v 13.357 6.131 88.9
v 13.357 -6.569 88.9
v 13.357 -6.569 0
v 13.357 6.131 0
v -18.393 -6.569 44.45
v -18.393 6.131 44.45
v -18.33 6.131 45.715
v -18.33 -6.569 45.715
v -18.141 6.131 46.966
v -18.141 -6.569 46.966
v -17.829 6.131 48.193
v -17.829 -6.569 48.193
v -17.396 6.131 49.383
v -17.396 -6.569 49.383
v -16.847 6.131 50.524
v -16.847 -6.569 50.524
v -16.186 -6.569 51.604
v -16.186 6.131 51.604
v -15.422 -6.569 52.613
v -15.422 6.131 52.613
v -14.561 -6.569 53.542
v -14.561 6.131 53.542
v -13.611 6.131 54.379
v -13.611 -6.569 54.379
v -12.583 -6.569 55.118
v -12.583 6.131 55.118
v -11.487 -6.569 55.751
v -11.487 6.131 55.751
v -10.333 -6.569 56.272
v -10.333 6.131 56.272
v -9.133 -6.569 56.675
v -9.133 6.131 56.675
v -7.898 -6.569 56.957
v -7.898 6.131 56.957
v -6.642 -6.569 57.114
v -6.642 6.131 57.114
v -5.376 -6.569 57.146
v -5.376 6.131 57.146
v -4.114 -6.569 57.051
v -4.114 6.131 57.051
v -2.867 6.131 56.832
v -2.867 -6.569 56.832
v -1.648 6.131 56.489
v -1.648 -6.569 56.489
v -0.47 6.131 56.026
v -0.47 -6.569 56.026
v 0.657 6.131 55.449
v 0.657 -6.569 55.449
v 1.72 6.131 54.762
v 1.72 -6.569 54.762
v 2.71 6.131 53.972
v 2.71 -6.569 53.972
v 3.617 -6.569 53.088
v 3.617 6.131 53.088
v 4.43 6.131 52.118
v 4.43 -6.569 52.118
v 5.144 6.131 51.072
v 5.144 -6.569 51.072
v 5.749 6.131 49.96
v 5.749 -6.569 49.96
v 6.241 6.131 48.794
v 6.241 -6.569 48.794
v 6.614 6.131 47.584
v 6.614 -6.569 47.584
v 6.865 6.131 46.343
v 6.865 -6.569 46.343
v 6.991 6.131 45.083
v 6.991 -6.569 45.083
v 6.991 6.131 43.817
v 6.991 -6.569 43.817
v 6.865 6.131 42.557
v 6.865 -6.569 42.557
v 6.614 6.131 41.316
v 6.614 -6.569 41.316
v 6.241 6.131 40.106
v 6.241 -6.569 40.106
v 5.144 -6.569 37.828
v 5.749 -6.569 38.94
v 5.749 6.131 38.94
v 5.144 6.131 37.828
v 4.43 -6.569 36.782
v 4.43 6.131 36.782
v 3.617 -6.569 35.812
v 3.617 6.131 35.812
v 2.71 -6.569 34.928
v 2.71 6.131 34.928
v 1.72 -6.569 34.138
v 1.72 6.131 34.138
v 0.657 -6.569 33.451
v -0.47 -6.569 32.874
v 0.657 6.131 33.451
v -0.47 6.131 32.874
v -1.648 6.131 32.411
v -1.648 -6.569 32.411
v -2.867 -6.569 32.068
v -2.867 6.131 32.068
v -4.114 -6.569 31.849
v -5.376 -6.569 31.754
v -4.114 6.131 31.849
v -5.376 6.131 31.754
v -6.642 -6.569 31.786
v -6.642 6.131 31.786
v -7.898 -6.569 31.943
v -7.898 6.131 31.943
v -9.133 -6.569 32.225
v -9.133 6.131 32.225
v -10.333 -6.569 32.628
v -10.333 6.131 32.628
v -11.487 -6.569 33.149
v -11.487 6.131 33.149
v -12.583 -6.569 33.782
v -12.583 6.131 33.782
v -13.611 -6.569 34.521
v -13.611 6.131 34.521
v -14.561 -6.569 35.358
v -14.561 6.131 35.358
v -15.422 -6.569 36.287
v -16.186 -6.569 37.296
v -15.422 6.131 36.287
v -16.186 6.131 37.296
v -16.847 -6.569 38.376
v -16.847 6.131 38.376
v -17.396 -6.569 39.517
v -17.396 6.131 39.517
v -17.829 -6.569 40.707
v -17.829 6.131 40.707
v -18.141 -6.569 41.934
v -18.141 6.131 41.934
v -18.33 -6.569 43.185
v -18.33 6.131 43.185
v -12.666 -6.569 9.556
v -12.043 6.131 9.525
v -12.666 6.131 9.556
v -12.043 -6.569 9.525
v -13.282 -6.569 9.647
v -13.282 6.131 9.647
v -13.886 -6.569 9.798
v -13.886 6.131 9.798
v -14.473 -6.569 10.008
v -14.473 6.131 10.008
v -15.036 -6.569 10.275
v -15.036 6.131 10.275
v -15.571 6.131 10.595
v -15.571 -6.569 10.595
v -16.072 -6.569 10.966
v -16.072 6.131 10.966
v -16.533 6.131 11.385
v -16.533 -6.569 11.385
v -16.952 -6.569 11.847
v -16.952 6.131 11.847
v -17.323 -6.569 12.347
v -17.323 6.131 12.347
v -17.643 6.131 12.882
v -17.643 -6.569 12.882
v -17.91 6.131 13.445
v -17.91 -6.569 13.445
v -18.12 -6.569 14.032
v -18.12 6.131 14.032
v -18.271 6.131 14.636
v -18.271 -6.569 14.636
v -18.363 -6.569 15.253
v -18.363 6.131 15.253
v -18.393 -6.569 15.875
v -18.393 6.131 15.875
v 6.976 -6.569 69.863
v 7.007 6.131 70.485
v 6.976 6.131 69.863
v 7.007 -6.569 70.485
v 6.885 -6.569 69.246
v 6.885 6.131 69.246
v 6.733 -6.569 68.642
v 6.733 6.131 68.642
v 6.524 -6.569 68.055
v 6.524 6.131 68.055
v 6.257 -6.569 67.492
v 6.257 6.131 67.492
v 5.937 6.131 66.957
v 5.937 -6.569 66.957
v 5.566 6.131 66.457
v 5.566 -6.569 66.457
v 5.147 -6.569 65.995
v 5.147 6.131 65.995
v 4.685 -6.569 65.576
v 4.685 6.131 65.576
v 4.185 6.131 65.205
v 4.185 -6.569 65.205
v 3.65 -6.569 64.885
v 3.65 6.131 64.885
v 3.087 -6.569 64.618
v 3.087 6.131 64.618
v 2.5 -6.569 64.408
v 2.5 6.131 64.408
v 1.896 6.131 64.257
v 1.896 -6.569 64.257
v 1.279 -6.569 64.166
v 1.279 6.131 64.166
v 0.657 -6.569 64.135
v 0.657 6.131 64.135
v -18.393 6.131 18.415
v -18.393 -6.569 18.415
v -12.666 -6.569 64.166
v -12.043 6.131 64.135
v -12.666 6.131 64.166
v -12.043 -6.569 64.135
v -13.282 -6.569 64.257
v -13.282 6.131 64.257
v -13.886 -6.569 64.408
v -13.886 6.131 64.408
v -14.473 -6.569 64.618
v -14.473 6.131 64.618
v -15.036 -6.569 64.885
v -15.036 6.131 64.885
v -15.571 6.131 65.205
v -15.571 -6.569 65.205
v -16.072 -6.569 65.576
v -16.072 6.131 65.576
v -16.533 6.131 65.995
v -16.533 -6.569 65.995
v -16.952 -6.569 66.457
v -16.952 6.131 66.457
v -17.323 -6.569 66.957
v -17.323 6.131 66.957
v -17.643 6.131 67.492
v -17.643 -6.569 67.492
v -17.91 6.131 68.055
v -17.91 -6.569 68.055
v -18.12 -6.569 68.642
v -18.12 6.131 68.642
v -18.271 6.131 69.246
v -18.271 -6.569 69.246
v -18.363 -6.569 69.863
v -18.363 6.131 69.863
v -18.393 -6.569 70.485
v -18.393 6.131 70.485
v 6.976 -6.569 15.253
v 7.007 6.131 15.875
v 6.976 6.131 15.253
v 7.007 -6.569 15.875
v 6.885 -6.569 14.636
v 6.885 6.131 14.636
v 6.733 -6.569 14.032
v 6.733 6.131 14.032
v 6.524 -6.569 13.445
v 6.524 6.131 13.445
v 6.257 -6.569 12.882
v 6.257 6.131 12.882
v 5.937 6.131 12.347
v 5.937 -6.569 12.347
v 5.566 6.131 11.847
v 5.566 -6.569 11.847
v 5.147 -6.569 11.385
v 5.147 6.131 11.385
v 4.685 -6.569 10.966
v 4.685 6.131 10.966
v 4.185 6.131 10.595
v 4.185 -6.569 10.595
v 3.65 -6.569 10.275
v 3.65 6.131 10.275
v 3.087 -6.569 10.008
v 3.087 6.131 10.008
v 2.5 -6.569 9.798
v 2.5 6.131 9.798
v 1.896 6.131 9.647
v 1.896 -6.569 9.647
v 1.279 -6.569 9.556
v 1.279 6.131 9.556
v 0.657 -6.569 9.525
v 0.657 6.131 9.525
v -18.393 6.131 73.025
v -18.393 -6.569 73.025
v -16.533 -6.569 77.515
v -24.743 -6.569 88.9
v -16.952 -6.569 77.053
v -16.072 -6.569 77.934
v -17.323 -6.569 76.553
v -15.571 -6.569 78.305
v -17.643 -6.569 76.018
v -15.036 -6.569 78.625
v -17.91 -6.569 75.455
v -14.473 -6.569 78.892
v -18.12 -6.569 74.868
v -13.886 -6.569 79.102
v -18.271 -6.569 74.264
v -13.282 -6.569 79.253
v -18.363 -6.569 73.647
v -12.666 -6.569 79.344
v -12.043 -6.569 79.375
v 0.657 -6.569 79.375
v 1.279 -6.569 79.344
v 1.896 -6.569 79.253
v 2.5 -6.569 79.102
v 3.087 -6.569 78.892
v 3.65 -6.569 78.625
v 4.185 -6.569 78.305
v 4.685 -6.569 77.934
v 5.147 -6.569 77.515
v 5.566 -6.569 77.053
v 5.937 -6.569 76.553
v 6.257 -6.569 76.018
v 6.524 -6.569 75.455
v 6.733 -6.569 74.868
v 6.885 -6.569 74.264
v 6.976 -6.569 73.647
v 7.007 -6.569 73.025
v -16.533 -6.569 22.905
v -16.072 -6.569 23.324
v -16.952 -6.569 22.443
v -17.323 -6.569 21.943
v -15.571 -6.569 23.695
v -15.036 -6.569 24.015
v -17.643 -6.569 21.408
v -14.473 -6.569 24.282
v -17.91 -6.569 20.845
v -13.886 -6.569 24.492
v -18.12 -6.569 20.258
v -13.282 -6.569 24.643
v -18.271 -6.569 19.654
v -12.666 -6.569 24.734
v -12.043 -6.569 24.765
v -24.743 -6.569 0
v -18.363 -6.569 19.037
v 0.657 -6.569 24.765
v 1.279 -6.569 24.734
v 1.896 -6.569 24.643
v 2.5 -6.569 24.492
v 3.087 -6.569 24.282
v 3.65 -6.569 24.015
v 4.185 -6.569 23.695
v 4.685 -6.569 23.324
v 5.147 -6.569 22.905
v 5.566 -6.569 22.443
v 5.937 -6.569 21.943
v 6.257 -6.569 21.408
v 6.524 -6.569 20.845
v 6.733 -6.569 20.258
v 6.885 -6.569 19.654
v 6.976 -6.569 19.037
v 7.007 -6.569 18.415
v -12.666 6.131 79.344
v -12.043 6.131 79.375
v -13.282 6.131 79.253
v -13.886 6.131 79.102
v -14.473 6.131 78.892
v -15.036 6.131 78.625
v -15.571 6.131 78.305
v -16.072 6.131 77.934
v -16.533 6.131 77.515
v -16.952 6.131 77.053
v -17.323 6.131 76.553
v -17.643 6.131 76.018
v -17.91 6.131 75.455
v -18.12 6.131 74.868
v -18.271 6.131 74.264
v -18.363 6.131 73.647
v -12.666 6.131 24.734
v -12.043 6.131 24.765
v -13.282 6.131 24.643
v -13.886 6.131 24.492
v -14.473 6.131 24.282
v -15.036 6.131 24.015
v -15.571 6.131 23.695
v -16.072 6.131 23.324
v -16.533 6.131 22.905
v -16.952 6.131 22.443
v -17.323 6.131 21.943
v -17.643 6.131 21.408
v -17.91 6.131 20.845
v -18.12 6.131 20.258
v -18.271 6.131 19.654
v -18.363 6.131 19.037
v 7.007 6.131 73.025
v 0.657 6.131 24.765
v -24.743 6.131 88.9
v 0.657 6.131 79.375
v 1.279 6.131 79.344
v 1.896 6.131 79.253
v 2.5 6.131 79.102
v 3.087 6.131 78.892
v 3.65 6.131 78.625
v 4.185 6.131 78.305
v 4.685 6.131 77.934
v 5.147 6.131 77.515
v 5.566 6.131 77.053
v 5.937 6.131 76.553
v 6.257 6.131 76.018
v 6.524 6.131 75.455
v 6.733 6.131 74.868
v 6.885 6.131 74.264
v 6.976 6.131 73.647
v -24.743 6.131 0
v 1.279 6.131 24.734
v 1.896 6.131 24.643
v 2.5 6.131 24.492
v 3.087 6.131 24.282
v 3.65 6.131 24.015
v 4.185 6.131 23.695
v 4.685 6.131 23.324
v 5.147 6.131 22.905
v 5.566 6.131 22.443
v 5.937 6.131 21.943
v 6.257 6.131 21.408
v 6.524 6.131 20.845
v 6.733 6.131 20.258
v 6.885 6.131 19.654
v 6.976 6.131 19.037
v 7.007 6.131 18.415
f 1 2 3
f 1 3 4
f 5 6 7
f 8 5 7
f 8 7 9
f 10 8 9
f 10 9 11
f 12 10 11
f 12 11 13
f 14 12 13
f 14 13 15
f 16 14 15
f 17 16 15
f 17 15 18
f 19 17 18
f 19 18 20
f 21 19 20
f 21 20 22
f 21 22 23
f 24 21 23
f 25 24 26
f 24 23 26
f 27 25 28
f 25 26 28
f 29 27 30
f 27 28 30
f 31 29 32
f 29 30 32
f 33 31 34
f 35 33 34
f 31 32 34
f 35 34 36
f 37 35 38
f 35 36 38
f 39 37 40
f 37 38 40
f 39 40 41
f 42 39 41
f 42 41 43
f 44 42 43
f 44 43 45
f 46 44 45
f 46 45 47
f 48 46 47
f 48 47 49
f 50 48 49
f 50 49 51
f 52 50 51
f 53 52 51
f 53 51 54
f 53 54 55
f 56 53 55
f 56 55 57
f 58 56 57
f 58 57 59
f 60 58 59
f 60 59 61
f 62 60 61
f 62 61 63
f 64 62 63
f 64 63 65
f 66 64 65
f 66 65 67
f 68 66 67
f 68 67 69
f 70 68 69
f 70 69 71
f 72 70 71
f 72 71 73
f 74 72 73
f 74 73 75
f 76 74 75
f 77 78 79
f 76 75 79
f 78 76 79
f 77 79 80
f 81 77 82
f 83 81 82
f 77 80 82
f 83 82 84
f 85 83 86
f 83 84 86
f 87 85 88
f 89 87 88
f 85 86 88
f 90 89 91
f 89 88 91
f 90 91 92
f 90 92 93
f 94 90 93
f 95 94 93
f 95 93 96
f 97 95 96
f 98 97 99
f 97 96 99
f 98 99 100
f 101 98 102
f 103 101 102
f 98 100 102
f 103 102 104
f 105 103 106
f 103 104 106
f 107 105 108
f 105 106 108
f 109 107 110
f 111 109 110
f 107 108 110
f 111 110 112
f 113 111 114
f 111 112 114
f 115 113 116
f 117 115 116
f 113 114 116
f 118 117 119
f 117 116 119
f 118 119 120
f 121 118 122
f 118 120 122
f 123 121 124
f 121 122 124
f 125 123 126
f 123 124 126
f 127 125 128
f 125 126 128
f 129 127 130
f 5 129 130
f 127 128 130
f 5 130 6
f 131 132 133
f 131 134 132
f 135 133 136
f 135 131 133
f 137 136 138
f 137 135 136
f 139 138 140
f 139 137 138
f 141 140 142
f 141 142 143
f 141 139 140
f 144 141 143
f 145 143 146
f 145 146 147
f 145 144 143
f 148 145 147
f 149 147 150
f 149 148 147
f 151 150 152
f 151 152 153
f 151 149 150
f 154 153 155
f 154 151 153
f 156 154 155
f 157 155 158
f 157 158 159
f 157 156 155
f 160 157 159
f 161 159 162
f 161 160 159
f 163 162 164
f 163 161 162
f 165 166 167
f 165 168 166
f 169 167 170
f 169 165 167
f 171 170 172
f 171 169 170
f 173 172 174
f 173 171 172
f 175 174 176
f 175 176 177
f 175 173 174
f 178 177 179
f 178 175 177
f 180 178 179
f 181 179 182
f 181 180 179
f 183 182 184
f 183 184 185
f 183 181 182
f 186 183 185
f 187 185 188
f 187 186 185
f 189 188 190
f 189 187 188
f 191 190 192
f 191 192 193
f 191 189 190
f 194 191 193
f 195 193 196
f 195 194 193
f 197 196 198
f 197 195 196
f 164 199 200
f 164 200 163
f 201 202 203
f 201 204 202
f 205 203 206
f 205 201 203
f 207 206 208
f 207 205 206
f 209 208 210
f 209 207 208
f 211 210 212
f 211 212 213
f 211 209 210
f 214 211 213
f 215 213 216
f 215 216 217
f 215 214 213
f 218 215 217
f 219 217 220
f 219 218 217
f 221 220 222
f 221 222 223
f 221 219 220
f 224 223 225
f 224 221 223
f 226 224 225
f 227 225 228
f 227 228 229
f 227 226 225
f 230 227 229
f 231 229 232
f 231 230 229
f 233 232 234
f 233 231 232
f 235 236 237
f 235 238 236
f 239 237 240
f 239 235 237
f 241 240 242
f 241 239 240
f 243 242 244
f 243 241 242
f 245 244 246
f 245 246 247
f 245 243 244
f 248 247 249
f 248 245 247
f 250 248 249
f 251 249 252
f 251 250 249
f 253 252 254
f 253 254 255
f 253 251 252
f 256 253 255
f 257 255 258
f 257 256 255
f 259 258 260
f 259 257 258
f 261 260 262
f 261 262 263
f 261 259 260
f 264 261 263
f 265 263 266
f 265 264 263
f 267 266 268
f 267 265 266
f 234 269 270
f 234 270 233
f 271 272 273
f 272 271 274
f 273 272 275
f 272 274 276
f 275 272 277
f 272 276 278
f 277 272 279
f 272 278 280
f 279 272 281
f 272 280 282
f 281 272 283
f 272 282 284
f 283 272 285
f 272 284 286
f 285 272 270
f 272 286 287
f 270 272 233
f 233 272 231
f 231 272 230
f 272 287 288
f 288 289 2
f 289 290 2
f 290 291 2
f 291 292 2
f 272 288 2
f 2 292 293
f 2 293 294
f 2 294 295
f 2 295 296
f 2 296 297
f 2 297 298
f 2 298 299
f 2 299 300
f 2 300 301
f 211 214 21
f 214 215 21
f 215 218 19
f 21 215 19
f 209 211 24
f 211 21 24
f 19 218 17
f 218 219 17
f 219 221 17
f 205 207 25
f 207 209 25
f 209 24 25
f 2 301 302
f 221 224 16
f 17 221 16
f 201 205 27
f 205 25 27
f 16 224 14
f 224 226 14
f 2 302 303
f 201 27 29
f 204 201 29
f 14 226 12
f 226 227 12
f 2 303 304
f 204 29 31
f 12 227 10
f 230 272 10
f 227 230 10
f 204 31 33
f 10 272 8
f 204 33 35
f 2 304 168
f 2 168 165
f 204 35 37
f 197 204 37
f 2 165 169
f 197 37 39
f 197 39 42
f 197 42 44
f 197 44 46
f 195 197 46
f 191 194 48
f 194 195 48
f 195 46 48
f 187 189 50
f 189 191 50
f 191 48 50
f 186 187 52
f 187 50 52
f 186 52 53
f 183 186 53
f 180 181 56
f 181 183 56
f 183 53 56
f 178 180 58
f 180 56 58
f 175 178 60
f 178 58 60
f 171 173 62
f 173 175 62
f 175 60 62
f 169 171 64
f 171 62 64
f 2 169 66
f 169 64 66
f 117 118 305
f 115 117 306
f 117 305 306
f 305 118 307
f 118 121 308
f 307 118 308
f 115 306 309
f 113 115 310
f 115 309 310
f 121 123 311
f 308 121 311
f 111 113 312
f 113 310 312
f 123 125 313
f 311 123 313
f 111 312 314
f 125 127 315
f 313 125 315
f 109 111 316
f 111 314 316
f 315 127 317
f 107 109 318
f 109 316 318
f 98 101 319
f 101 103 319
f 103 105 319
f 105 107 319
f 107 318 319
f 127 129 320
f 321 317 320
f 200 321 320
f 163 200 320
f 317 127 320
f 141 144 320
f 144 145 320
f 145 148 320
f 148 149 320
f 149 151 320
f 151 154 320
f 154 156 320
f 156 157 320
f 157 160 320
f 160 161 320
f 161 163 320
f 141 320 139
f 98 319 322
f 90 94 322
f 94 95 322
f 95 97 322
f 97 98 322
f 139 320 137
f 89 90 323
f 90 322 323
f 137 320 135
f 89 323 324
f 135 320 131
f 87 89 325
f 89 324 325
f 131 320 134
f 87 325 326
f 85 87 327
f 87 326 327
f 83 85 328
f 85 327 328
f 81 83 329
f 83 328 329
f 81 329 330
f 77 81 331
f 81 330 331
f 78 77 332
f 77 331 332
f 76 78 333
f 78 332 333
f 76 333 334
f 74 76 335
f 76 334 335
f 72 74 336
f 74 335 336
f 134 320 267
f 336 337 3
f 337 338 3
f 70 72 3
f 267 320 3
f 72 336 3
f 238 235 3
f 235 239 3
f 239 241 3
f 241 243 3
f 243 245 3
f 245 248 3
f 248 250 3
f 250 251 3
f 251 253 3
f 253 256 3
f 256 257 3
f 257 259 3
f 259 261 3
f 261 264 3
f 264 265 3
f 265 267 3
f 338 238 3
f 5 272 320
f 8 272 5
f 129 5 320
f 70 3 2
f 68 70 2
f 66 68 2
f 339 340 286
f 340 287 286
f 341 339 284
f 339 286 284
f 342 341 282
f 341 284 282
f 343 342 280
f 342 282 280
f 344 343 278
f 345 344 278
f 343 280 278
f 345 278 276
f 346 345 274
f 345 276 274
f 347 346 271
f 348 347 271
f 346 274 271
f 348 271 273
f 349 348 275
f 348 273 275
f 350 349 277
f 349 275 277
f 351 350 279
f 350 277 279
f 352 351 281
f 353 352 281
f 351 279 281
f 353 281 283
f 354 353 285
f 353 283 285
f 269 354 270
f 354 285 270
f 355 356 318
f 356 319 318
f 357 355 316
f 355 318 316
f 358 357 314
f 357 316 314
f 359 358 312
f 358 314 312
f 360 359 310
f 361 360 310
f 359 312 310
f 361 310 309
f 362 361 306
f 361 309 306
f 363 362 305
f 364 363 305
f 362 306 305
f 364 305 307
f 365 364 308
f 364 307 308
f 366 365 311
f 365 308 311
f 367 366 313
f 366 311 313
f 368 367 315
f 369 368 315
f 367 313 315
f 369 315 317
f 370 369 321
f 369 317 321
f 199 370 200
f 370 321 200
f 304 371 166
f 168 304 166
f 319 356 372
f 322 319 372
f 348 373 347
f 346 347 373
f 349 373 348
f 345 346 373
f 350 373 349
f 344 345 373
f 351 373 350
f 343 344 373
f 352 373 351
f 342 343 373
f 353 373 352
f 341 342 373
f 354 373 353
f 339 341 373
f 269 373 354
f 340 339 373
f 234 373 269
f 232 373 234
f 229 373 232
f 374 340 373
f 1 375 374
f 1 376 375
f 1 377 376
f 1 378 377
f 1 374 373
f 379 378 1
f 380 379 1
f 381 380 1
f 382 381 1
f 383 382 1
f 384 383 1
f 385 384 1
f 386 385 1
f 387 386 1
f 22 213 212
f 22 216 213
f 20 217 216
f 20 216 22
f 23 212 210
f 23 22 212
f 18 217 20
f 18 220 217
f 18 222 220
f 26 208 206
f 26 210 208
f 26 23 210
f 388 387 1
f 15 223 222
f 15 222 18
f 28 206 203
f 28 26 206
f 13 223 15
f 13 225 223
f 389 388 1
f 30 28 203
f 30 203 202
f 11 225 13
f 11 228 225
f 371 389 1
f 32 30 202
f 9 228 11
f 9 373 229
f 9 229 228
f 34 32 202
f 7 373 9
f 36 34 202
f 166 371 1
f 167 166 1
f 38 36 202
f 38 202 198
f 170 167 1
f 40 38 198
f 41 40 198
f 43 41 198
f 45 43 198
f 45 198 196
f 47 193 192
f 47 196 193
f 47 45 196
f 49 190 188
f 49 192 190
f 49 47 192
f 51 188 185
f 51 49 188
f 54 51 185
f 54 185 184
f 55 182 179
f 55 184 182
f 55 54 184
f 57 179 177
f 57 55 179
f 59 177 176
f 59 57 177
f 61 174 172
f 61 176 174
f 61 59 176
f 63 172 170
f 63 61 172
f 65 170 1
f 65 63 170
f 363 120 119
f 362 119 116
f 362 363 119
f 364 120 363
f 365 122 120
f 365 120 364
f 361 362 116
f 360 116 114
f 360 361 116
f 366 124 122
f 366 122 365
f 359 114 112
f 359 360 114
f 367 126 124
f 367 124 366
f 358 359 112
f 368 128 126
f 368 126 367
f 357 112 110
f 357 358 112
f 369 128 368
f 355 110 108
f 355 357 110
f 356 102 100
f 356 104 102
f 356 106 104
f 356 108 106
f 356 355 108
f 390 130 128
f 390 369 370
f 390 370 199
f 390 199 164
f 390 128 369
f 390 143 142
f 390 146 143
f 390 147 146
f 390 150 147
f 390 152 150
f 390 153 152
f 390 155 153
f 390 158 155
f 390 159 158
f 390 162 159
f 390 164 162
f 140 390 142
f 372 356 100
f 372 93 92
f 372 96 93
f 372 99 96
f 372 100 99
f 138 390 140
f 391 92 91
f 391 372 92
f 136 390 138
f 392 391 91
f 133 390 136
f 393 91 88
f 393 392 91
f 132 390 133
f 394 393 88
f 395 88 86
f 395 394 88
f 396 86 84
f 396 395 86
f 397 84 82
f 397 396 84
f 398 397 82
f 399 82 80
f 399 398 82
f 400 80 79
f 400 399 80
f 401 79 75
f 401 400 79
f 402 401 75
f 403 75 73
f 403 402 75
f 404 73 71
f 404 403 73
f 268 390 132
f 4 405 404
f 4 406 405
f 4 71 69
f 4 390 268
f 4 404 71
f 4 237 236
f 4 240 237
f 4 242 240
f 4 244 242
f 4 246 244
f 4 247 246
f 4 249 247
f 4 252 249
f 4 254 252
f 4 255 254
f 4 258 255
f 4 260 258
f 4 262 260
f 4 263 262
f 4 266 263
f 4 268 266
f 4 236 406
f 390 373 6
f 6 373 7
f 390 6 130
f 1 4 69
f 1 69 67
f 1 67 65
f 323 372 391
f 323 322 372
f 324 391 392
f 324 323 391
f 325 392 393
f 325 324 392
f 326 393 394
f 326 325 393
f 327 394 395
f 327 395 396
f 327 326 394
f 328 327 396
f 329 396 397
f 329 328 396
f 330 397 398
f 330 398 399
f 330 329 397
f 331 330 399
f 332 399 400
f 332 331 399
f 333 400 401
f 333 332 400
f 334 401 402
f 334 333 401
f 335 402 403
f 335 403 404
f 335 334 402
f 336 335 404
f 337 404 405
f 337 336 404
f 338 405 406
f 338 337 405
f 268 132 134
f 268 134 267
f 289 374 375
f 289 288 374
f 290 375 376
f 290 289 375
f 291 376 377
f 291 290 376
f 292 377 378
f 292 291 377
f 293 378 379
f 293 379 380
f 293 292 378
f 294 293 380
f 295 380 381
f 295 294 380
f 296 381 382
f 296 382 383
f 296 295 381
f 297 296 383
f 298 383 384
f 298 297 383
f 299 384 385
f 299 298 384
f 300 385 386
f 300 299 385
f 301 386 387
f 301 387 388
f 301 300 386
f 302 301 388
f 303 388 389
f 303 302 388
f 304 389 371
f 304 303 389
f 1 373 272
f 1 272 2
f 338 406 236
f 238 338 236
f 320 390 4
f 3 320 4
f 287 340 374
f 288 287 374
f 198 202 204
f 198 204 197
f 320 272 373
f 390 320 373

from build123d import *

# Parameters (mm, degrees)
SKETCH1_W           = 38.1
SKETCH1_H           = 12.7
BOSS_EXTRUDE1_DEPTH = 88.9
SKETCH2_R           = 12.7
CUT_EXTRUDE1_DEPTH  = 88.9
SKETCH3_W           = 25.4
SKETCH3_H           = 15.24
CUT_EXTRUDE2_DEPTH  = 12.7
FILLET1_R           = 6.35


with BuildPart() as part:
    # Sketch1 → Boss-Extrude1 (new body)
    with BuildSketch(Plane.XY):
        with Locations((-5.693103448, -0.218965517)):
            Rectangle(SKETCH1_W, SKETCH1_H)
    extrude(amount=BOSS_EXTRUDE1_DEPTH)

    # Sketch2 → Cut-Extrude1 (cut)
    with BuildSketch(Plane(origin=(0, 6.131034483, 0), x_dir=(1, 0, 0), z_dir=(0, 1, 0))):
        with Locations(Location((-5.693103448, -44.45, 0), (0, 0, 180))):
            Circle(SKETCH2_R)
    extrude(amount=-CUT_EXTRUDE1_DEPTH, mode=Mode.SUBTRACT)

    # Sketch3 → Cut-Extrude2 (cut)
    with BuildSketch(Plane(origin=(0, 6.131034483, 0), x_dir=(1, 0, 0), z_dir=(0, 1, 0))):
        with Locations((-5.693103448, -17.145)):
            Rectangle(SKETCH3_W, SKETCH3_H)
        with Locations((-5.693103448, -71.755)):
            Rectangle(SKETCH3_W, SKETCH3_H)
    extrude(amount=-CUT_EXTRUDE2_DEPTH, mode=Mode.SUBTRACT)

    # Fillet1
    fillet1_edges = [part.edges().sort_by_distance(p)[0] for p in [
        (-18.393103448, -0.218965517, 24.765),
        (-18.393103448, -0.218965517, 9.525),
        (7.006896552, -0.218965517, 9.525),
        (7.006896552, -0.218965517, 24.765),
        (-18.393103448, -0.218965517, 79.375),
        (-18.393103448, -0.218965517, 64.135),
        (7.006896552, -0.218965517, 64.135),
        (7.006896552, -0.218965517, 79.375),
    ]]
    fillet(fillet1_edges, radius=FILLET1_R)


solid = part.part
